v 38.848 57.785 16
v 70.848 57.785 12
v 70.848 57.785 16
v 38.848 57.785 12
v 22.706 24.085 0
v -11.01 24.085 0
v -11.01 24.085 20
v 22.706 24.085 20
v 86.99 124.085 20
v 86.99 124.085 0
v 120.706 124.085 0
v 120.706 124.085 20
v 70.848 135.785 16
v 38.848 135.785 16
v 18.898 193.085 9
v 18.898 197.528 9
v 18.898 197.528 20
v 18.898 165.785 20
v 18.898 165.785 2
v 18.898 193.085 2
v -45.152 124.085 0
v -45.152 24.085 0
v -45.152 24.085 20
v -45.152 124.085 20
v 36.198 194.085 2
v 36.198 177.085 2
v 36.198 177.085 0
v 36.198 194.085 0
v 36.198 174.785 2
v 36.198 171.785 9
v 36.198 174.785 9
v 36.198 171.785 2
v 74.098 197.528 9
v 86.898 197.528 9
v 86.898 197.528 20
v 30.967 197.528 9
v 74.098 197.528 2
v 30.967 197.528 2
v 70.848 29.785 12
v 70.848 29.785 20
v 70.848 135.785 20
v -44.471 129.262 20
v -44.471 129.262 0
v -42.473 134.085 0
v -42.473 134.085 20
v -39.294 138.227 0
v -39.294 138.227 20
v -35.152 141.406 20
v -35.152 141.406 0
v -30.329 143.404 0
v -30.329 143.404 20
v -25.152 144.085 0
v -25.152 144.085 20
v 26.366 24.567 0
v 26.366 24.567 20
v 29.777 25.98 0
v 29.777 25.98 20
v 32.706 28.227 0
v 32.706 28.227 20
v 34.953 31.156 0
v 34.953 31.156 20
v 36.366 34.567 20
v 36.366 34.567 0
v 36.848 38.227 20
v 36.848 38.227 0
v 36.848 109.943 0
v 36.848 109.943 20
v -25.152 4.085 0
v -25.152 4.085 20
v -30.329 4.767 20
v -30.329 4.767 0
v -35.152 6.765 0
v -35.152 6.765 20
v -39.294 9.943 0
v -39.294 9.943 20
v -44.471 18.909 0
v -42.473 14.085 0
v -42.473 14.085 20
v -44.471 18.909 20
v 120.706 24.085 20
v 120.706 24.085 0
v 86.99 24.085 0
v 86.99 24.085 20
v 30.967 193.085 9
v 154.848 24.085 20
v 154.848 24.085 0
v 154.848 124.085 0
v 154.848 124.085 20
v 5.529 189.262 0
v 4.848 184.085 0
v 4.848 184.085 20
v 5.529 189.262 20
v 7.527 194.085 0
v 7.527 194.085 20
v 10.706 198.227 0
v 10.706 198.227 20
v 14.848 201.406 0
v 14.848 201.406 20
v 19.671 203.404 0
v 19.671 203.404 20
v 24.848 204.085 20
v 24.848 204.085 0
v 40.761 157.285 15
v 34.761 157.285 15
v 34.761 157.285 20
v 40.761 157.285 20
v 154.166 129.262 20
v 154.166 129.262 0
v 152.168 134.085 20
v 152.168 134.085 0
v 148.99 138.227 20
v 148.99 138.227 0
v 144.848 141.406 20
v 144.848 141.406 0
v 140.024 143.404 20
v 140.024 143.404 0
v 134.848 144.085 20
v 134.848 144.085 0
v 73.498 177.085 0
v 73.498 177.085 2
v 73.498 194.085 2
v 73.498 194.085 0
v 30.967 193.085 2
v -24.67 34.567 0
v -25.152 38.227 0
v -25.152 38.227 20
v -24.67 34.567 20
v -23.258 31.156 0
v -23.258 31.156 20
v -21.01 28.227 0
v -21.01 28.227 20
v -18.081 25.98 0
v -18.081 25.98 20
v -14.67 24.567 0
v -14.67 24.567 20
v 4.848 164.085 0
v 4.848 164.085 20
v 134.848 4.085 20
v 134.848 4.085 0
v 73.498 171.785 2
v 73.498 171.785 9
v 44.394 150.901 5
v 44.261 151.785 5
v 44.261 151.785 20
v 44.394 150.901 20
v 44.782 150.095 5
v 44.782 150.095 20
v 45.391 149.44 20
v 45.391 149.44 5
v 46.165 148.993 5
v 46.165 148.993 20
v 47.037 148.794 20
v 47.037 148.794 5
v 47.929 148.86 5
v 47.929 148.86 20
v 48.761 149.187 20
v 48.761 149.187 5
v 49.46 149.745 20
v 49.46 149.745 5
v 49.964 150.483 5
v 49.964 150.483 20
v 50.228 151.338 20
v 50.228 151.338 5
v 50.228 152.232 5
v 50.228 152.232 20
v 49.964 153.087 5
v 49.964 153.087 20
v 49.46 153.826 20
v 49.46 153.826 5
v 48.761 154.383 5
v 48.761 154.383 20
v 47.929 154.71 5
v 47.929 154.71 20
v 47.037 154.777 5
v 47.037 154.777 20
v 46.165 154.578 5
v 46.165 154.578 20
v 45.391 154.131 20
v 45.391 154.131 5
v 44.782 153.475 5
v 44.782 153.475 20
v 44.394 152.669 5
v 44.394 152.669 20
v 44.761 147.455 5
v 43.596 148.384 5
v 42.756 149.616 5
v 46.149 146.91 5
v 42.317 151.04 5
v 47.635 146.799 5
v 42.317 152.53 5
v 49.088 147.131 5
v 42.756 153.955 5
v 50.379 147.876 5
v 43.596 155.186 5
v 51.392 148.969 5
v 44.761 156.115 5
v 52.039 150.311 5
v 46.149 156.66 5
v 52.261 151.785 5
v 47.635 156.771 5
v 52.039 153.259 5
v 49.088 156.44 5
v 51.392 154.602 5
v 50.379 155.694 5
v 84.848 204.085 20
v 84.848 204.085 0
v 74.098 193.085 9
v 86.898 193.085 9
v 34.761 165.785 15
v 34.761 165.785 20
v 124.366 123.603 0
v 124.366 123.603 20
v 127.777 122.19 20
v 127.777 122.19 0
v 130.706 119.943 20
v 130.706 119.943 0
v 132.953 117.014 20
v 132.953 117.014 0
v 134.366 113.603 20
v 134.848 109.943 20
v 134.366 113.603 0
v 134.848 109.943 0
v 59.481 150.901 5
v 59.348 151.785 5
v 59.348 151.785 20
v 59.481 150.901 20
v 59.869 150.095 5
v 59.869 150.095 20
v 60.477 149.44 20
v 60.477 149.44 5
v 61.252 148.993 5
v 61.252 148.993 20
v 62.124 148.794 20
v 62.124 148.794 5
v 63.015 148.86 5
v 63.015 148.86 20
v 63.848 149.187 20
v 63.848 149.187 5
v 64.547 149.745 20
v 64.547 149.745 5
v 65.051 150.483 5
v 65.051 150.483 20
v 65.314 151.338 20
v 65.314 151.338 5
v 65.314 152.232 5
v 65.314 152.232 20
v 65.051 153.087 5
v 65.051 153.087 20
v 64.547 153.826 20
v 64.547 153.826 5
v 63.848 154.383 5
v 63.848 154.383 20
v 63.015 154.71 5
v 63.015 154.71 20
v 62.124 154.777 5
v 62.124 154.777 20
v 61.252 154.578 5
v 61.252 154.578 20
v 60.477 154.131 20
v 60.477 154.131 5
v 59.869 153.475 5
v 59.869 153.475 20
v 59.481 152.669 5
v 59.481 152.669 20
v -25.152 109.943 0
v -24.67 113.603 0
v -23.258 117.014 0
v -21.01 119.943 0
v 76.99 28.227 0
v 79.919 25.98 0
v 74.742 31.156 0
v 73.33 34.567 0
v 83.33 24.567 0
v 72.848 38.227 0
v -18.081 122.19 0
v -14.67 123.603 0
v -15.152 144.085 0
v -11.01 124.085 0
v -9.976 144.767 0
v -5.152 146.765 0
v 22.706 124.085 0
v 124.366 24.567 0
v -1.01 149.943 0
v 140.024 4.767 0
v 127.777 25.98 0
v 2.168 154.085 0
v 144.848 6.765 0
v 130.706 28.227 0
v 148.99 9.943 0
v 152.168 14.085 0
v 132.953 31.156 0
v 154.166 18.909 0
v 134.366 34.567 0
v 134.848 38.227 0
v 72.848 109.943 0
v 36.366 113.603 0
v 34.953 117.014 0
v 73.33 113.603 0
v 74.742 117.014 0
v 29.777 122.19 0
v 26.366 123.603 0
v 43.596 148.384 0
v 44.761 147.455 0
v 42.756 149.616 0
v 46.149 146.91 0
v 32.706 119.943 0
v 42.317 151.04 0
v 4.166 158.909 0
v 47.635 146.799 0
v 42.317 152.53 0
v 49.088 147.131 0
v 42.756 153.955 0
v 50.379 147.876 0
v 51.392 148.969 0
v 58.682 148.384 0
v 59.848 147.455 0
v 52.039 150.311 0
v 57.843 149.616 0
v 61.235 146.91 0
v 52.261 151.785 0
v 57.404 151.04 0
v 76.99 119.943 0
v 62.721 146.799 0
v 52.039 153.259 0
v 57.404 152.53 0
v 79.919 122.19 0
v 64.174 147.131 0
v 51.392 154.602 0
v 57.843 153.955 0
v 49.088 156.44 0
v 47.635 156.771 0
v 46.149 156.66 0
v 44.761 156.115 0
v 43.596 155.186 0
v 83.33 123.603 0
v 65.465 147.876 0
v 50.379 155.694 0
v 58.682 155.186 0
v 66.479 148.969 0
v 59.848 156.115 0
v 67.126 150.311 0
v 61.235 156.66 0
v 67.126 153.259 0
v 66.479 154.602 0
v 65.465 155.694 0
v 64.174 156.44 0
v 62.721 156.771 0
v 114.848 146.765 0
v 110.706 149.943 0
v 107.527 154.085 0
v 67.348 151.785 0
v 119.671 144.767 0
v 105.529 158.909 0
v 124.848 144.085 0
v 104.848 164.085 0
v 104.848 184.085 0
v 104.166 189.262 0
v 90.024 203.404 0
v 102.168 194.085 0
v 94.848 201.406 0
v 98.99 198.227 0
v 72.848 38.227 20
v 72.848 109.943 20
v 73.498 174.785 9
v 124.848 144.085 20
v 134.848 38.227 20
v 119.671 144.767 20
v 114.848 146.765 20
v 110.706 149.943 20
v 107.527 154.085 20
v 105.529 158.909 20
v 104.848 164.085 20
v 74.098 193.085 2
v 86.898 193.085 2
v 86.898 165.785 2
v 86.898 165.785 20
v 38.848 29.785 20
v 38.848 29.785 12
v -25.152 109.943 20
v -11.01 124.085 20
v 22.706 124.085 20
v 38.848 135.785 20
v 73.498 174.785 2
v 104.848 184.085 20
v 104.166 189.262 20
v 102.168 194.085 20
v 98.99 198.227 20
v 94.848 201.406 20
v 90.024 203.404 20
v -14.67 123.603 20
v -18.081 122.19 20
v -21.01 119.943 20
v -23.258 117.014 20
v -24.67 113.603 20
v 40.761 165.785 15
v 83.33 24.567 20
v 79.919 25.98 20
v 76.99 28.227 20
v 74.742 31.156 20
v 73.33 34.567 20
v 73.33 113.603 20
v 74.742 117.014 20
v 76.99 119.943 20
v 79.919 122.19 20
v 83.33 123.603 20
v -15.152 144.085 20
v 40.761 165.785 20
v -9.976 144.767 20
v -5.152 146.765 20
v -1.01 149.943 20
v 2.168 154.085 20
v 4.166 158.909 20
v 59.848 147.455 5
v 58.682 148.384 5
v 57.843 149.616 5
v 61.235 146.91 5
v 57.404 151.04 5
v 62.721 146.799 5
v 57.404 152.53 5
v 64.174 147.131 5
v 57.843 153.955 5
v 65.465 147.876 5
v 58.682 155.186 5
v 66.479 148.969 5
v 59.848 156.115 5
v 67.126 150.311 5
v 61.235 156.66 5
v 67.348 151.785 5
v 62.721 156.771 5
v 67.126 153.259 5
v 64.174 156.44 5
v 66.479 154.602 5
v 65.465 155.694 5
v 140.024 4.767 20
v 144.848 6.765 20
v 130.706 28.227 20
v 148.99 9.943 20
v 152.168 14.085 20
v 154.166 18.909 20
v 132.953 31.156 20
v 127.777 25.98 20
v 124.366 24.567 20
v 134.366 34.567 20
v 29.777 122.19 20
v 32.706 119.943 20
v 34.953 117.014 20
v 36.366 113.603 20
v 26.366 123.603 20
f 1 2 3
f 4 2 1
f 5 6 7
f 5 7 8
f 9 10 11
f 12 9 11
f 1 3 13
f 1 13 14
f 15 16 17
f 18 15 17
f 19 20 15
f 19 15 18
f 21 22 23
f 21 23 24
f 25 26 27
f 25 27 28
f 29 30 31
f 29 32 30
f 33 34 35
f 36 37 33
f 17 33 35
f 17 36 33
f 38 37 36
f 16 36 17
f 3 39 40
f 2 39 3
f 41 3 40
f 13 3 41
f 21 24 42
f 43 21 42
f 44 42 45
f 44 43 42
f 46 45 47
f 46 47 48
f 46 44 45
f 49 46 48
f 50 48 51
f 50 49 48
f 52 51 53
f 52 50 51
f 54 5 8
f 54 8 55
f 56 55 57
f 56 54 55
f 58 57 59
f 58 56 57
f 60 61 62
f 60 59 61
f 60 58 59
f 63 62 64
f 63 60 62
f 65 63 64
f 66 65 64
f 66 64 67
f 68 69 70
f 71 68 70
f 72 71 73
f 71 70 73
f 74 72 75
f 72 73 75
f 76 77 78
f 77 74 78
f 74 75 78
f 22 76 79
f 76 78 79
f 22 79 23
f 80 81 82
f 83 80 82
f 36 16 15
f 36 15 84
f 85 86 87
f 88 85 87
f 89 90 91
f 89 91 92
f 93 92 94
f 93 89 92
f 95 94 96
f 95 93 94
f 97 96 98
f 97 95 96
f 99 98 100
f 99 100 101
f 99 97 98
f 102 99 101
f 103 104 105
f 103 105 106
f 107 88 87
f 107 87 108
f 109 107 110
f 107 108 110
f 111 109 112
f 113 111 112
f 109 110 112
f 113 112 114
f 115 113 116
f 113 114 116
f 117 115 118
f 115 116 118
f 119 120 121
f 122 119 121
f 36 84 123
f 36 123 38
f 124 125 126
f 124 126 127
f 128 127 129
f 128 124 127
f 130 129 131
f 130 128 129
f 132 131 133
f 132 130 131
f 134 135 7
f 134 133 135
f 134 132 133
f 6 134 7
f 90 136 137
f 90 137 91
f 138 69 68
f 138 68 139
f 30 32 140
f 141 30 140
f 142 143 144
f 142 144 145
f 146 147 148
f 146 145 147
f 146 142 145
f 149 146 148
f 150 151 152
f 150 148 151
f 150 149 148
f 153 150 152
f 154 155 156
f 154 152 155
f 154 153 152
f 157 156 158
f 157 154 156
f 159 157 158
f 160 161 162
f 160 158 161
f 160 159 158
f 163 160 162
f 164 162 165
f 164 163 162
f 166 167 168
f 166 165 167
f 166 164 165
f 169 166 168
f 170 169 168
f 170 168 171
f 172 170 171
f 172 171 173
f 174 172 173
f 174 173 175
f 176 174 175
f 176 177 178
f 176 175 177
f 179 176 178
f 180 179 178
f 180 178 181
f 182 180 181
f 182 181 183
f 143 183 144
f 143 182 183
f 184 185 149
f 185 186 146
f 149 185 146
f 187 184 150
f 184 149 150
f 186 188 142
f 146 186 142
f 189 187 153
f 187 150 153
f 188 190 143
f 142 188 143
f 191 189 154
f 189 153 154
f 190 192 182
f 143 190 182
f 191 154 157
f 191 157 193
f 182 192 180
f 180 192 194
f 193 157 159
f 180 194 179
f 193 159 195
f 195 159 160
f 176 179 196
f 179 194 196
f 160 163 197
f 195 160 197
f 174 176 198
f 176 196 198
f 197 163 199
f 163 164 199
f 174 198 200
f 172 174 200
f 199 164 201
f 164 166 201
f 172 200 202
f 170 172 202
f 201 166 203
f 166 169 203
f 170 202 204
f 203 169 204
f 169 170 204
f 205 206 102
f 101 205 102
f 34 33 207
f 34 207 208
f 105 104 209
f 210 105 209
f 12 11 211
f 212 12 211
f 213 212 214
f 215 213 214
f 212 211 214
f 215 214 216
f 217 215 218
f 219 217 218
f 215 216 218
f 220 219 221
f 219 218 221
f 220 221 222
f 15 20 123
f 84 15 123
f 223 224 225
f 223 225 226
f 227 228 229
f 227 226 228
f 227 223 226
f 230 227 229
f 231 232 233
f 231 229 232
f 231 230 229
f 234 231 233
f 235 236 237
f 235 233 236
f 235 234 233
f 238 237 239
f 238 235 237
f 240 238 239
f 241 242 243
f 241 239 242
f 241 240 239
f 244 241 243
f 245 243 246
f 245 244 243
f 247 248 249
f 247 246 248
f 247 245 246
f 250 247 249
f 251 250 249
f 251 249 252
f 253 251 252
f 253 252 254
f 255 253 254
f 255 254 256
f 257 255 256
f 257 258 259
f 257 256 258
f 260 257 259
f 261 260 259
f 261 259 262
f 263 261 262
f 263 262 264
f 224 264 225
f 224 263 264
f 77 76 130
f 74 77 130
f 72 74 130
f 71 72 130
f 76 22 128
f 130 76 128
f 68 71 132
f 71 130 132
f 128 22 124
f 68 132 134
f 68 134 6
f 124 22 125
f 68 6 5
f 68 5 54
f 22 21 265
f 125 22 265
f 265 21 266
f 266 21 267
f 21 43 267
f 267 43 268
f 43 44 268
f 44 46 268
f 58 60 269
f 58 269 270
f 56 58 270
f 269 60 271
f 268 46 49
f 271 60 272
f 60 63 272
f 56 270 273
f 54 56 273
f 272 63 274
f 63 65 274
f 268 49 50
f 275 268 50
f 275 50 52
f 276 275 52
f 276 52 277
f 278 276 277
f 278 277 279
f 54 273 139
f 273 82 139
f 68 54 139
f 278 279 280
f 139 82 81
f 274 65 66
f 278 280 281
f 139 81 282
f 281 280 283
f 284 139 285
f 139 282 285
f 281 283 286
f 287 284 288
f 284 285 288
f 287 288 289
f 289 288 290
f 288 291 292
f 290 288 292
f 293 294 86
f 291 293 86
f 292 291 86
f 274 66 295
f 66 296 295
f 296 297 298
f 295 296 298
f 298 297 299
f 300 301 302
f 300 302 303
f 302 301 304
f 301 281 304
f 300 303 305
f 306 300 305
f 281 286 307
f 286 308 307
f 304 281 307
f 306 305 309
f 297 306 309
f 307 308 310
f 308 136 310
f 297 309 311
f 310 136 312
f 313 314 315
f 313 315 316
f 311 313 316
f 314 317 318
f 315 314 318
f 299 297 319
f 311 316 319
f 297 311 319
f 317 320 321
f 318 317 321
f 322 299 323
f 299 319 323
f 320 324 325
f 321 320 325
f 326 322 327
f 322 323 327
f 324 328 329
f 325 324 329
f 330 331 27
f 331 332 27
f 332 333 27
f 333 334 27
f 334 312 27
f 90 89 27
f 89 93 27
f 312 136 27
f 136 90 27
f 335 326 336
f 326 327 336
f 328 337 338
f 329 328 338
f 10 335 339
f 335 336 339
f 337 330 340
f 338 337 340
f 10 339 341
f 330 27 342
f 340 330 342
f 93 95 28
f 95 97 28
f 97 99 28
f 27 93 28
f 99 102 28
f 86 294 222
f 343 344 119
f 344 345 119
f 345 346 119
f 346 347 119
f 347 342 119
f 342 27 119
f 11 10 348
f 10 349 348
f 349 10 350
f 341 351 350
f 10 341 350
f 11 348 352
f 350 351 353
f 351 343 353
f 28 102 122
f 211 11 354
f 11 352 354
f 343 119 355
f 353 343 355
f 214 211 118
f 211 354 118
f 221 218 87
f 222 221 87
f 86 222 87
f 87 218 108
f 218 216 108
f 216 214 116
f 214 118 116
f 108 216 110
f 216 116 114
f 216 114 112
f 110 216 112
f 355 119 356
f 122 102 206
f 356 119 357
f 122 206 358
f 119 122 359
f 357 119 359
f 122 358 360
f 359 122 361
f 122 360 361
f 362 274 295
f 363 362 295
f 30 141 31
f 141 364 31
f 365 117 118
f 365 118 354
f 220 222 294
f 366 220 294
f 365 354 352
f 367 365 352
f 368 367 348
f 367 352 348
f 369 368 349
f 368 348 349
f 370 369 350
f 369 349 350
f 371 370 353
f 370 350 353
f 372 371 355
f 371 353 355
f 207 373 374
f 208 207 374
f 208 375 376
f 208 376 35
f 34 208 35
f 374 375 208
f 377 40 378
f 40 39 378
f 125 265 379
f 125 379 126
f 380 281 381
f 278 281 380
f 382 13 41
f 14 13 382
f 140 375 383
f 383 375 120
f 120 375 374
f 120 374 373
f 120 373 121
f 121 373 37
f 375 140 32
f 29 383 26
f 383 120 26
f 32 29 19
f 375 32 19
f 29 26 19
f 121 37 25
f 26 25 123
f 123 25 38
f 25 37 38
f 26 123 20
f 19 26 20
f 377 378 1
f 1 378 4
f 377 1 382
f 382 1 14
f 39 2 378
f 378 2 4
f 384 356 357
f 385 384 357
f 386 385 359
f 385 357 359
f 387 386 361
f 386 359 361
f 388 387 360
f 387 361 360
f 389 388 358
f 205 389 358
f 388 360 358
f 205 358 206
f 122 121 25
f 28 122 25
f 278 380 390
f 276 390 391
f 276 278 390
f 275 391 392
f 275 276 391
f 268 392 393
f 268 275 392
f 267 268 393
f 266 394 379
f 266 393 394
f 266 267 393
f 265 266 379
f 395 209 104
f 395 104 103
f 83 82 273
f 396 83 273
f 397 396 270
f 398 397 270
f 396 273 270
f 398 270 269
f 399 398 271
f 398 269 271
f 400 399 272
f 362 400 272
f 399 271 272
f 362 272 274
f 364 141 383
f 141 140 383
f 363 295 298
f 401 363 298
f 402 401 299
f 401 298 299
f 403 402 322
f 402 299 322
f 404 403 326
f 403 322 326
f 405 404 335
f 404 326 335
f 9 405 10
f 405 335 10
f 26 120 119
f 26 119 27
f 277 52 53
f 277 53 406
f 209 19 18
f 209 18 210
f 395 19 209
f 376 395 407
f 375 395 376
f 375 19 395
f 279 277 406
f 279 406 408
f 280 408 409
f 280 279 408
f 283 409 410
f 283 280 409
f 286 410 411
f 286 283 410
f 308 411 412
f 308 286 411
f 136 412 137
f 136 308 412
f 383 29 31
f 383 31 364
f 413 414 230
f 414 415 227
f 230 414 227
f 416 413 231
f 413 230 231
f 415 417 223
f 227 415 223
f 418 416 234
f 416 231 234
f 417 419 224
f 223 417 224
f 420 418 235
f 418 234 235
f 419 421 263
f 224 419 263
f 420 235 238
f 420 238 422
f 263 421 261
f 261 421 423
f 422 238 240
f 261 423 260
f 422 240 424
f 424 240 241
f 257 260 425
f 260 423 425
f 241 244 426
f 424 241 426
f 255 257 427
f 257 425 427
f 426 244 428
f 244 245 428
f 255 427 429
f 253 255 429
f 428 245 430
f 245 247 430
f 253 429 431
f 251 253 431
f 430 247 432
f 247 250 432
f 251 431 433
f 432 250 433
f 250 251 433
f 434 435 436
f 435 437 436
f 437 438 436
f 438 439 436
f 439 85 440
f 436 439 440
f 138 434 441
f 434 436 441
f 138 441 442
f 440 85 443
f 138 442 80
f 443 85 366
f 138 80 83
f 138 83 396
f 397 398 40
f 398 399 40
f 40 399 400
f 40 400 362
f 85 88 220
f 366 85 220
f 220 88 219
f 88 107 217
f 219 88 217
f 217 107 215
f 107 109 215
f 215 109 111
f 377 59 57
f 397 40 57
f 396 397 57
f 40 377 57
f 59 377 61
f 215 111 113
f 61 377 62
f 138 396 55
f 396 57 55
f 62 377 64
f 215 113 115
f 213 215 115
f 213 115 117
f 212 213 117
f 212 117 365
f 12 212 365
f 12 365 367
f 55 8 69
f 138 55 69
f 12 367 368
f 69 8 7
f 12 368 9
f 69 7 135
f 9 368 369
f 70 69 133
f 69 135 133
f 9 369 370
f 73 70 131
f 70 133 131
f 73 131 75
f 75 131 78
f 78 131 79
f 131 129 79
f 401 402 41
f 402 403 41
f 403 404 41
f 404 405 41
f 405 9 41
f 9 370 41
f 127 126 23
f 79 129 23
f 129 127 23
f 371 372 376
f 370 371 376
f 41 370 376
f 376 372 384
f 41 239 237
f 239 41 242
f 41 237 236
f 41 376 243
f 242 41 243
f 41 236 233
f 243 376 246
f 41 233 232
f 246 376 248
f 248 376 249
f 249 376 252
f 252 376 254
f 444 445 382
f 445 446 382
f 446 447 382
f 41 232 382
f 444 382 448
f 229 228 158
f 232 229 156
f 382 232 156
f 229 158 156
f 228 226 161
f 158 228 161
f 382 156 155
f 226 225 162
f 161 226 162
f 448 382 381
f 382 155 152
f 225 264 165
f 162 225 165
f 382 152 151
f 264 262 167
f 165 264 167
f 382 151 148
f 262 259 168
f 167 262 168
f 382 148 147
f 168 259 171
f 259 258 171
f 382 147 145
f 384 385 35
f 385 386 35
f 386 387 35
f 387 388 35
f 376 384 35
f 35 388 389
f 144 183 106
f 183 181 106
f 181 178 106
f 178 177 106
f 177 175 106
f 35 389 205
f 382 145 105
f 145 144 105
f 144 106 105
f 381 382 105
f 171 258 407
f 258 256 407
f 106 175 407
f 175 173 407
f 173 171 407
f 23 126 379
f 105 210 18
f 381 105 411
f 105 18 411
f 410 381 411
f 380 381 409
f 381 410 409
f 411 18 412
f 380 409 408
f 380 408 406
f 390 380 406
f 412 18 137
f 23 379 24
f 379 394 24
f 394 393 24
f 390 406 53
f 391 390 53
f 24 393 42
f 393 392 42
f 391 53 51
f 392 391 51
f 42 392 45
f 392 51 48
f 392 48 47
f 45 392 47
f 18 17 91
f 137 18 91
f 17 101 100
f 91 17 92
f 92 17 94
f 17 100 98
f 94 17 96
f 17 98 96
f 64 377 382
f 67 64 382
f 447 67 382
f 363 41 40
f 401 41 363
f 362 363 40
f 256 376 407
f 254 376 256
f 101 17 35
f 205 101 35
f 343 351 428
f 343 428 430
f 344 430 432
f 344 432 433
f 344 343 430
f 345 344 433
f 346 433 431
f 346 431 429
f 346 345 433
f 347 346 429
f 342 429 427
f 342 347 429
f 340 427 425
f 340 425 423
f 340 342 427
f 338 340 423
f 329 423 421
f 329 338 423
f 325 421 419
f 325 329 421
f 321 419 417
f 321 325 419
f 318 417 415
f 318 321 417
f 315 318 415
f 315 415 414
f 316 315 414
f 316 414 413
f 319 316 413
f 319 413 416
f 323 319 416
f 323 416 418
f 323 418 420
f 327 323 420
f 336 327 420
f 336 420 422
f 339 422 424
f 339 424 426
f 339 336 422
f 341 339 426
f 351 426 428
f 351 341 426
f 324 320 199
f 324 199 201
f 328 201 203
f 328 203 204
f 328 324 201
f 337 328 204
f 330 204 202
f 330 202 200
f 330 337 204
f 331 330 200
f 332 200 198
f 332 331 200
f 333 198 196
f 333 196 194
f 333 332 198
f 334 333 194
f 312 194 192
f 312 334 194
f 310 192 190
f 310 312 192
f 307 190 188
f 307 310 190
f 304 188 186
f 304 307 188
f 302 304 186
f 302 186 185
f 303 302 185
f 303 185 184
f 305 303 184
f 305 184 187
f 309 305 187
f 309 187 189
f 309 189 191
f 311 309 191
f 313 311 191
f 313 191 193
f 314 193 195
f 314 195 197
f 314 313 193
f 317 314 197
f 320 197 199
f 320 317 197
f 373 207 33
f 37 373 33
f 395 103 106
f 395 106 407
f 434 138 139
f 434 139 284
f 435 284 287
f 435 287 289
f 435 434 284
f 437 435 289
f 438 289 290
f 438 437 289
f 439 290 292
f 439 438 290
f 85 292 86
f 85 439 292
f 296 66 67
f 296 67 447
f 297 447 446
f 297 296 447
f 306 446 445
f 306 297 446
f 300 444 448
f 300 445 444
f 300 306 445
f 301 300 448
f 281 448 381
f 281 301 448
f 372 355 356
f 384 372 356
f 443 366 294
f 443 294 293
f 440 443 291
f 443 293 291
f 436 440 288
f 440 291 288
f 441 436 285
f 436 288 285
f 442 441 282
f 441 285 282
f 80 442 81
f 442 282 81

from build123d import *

# Parameters (mm, degrees)
IZIM1_W                      = 200
IZIM1_H                      = 230
Y_KSEKLIK_EKSTR_ZYON1_DEPTH  = 20
KES_EKSTR_ZYON11_DEPTH       = 75
IZIM4_W                      = 100
IZIM4_H                      = 230
KES_EKSTR_ZYON12_DEPTH       = 90
IZIM10_W                     = 32
IZIM10_H                     = 136
Y_KSEKLIK_EKSTR_ZYON6_DEPTH  = 20
KES_EKSTR_ZYON15_DEPTH       = 222
KES_EKSTR_ZYON15_DEPTH_BACK  = 26
Y_KSEKLIK_EKSTR_ZYON7_DEPTH  = 20
IZIM16_W                     = 37.3
IZIM16_H                     = 17
KES_EKSTR_ZYON16_DEPTH       = 20
KES_EKSTR_ZYON20_DEPTH       = 42
KES_EKSTR_ZYON21_DEPTH       = 42
IZIM20_W                     = 71.9
IZIM20_H                     = 2
KES_EKSTR_ZYON22_DEPTH       = 42
IZIM21_R                     = 1.5
Y_KSEKLIK_EKSTR_ZYON8_DEPTH  = 15
IZIM22_W                     = 3
IZIM22_H                     = 3
Y_KSEKLIK_EKSTR_ZYON9_DEPTH  = 8
IZIM23_W                     = 71.9
IZIM23_H                     = 36
Y_KSEKLIK_EKSTR_ZYON10_DEPTH = 1
KES_EKSTR_ZYON23_DEPTH       = 56
KES_EKSTR_ZYON23_DEPTH_BACK  = 86
IZIM24_W                     = 37.3
IZIM24_H                     = 17
IZIM26_W                     = 3
IZIM26_H                     = 3
Y_KSEKLIK_EKSTR_ZYON11_DEPTH = 8
IZIM27_W                     = 71.9
IZIM27_H                     = 2.056938391
Y_KSEKLIK_EKSTR_ZYON13_DEPTH = 19
Y_KSEKLIK_EKSTR_ZYON16_DEPTH = 19
IZIM31_W                     = 3
IZIM31_H                     = 3
Y_KSEKLIK_EKSTR_ZYON18_DEPTH = 8
IZIM32_R                     = 1.5
KES_EKSTR_ZYON24_DEPTH       = 32
IZIM33_R                     = 1.5
Y_KSEKLIK_EKSTR_ZYON19_DEPTH = 12
KES_EKSTR_ZYON27_DEPTH       = 1
KES_EKSTR_ZYON27_DEPTH_BACK  = 3
IZIM37_R                     = 2.5
KES_EKSTR_ZYON28_DEPTH       = 33
IZIM38_W                     = 34
IZIM38_H                     = 110
KES_EKSTR_ZYON33_DEPTH       = 42
IZIM40_W                     = 34
IZIM40_H                     = 110
Y_KSEKLIK_EKSTR_ZYON21_DEPTH = 15
IZIM41_W                     = 4
IZIM41_H                     = 8.5
KES_EKSTR_ZYON35_DEPTH       = 21
IZIM44_W                     = 4
IZIM44_H                     = 8.5
Y_KSEKLIK_EKSTR_ZYON23_DEPTH = 14
IZIM45_W                     = 1
IZIM45_H                     = 110
Y_KSEKLIK_EKSTR_ZYON25_DEPTH = 19
IZIM46_W                     = 12.0691428
IZIM46_H                     = 4.443061609
IZIM46_W_2                   = 12.8
Y_KSEKLIK_EKSTR_ZYON27_DEPTH = 8
IZIM47_W                     = 37.3
IZIM47_H                     = 3
Y_KSEKLIK_EKSTR_ZYON28_DEPTH = 8
KES_EKSTR_ZYON36_DEPTH       = 10
KES_EKSTR_ZYON36_DEPTH_BACK  = 38
IZIM48_W                     = 201.789222688
IZIM48_H                     = 30
KES_EKSTR_ZYON37_DEPTH       = 38
KES_EKSTR_ZYON37_DEPTH_BACK  = 38
KES_EKSTR_ZYON38_DEPTH       = 38
KES_EKSTR_ZYON38_DEPTH_BACK  = 38
SKETCH1_W                    = 32
SKETCH1_H                    = 28
CUT_EXTRUDE1_DEPTH           = 55
SKETCH2_W                    = 32
SKETCH2_H                    = 28
BOSS_EXTRUDE1_DEPTH          = 11
SKETCH3_W                    = 32
SKETCH3_H                    = 4
BOSS_EXTRUDE2_DEPTH          = 19
SKETCH4_W                    = 37.3
SKETCH4_H                    = 0.358806935
CUT_EXTRUDE3_DEPTH           = 11
SKETCH5_W                    = 37.3
SKETCH5_H                    = 0.35880693
BOSS_EXTRUDE3_DEPTH          = 9
SKETCH6_W                    = 37.3
SKETCH6_H                    = 0.358806935
BOSS_EXTRUDE4_DEPTH          = 2
SKETCH7_W                    = 6
SKETCH7_H                    = 8.5
CUT_EXTRUDE4_DEPTH           = 20
SKETCH8_W                    = 6
SKETCH8_H                    = 8.5
BOSS_EXTRUDE5_DEPTH          = 15
SKETCH9_R                    = 3
CUT_EXTRUDE5_DEPTH           = 27
SKETCH10_W                   = 12.0691428
SKETCH10_H                   = 4.443061609
CUT_EXTRUDE8_DEPTH           = 20
SKETCH11_W                   = 12.8
SKETCH11_H                   = 4.443061609
CUT_EXTRUDE9_DEPTH           = 22
SKETCH12_W                   = 12.0691428
SKETCH12_H                   = 4.443061609
SKETCH12_W_2                 = 12.8
BOSS_EXTRUDE6_DEPTH          = 9
CUT_EXTRUDE10_DEPTH          = 37
SKETCH14_R                   = 5
CUT_EXTRUDE11_DEPTH          = 5


with BuildPart() as part:
    # Çizim1 → Yükseklik-Ekstrüzyon1 (new body)
    with BuildSketch(Plane.XY):
        with Locations((54.847725907, 89.085138461)):
            Rectangle(IZIM1_W, IZIM1_H)
    extrude(amount=Y_KSEKLIK_EKSTR_ZYON1_DEPTH)

    # Çizim2 → Kes-Ekstrüzyon11 (cut)
    with BuildSketch(Plane.XY):
        with BuildLine():
            Line((4.847725907, 164.085138461), (4.847725907, 184.085138461))
            ThreePointArc((4.847725907, 184.085138461), (10.705590284, 198.227274085), (24.847725907, 204.085138461))
            Line((24.847725907, 204.085138461), (-45.152274093, 204.085138461))
            Line((-45.152274093, 204.085138461), (-45.152274093, 124.085138461))
            ThreePointArc((-45.152274093, 124.085138461), (-39.294409716, 138.227274085), (-25.152274093, 144.085138461))
            Line((-25.152274093, 144.085138461), (-15.152274093, 144.085138461))
            ThreePointArc((-15.152274093, 144.085138461), (-1.010138469, 149.943002837), (4.847725907, 164.085138461))
        make_face()
        with BuildLine():
            Line((-45.152274093, -25.914861539), (-25.152274093, -25.914861539))
            ThreePointArc((-25.152274093, -25.914861539), (-39.294409716, -20.056997163), (-45.152274093, -5.914861539))
            Line((-45.152274093, -5.914861539), (-45.152274093, -25.914861539))
        make_face()
    extrude(amount=KES_EKSTR_ZYON11_DEPTH, mode=Mode.SUBTRACT)

    # Çizim4 → Kes-Ekstrüzyon12 (cut)
    with BuildSketch(Plane.XY):
        with Locations((104.847725907, 89.085138461)):
            Rectangle(IZIM4_W, IZIM4_H)
    extrude(amount=KES_EKSTR_ZYON12_DEPTH, mode=Mode.SUBTRACT)

    # Aynalama35: part across plane


with BuildPart() as part_1:
    add(part.part)
    add(part.part.mirror(Plane(origin=(54.847725907, 0, 90), x_dir=(0, 0, 1), z_dir=(-1, 0, 0))))

    # Çizim10 → Yükseklik-Ekstrüzyon6 (add)
    with BuildSketch(Plane.XY):
        Polygon((38.847725907, 129.085138461), (72.847725907, 129.085138461), (72.847725907, -10.914861539), (36.847725907, -10.914861539), (36.847725907, 129.085138461), align=None)
        with Locations((54.847725907, 59.085138461)):
            Rectangle(IZIM10_W, IZIM10_H, mode=Mode.SUBTRACT)
    extrude(amount=-Y_KSEKLIK_EKSTR_ZYON6_DEPTH)

    # Çizim11 → Kes-Ekstrüzyon15 (cut, two sides: drawn at the far end of the back side and taken through both)
    with BuildSketch(Plane(origin=(0, 0, 0), x_dir=(0, 0, -1), z_dir=(1, 0, 0)).offset(-KES_EKSTR_ZYON15_DEPTH_BACK)):
        Polygon((20, -10.914861539), (14, -10.914861539), (20, 129.085138461), align=None)
    extrude(amount=KES_EKSTR_ZYON15_DEPTH + KES_EKSTR_ZYON15_DEPTH_BACK, mode=Mode.SUBTRACT)

    # Çizim15 → Yükseklik-Ekstrüzyon7 (add)
    with BuildSketch(Plane.XY):
        with BuildLine():
            Line((-45.152274093, 124.085138461), (-45.152274093, -5.914861539))
            ThreePointArc((-45.152274093, -5.914861539), (-39.294409716, -20.056997163), (-25.152274093, -25.914861539))
            Line((-25.152274093, -25.914861539), (134.847725907, -25.914861539))
            ThreePointArc((134.847725907, -25.914861539), (148.989861531, -20.056997163), (154.847725907, -5.914861539))
            Line((154.847725907, -5.914861539), (154.847725907, 124.085138461))
            ThreePointArc((154.847725907, 124.085138461), (148.989861531, 138.227274085), (134.847725907, 144.085138461))
            Line((134.847725907, 144.085138461), (124.847725907, 144.085138461))
            ThreePointArc((124.847725907, 144.085138461), (110.705590284, 149.943002837), (104.847725907, 164.085138461))
            Line((104.847725907, 164.085138461), (104.847725907, 184.085138461))
            ThreePointArc((104.847725907, 184.085138461), (98.989861531, 198.227274085), (84.847725907, 204.085138461))
            Line((84.847725907, 204.085138461), (24.847725907, 204.085138461))
            ThreePointArc((24.847725907, 204.085138461), (10.705590284, 198.227274085), (4.847725907, 184.085138461))
            Line((4.847725907, 184.085138461), (4.847725907, 164.085138461))
            ThreePointArc((4.847725907, 164.085138461), (-1.010138469, 149.943002837), (-15.152274093, 144.085138461))
            Line((-15.152274093, 144.085138461), (-25.152274093, 144.085138461))
            ThreePointArc((-25.152274093, 144.085138461), (-39.294409716, 138.227274085), (-45.152274093, 124.085138461))
        make_face()
    extrude(amount=Y_KSEKLIK_EKSTR_ZYON7_DEPTH)

    # Çizim16 → Kes-Ekstrüzyon16 (cut)
    with BuildSketch(Plane.XY):
        with Locations((54.847725907, 185.585138461)):
            Rectangle(IZIM16_W, IZIM16_H)
    extrude(amount=KES_EKSTR_ZYON16_DEPTH, mode=Mode.SUBTRACT)

    # Çizim18 → Kes-Ekstrüzyon20 (cut)
    with BuildSketch(Plane(origin=(0, 0, 1), x_dir=(-1, 0, 0), z_dir=(0, 0, -1))):
        Polygon((-90.797725907, 197.585138461), (-90.797725907, 185.585138461), (-90.797725907, 163.585138461), (-18.897725907, 163.585138461), (-18.897725907, 197.585138461), align=None)
    extrude(amount=-KES_EKSTR_ZYON20_DEPTH, mode=Mode.SUBTRACT)

    # Çizim19 → Kes-Ekstrüzyon21 (cut)
    with BuildSketch(Plane(origin=(72.847725907, 0, 0), x_dir=(0, 0, -1), z_dir=(1, 0, 0))):
        Polygon((0, 129.085138461), (20, 129.085138461), (14, -10.914861539), (0, -10.914861539), align=None)
    extrude(amount=-KES_EKSTR_ZYON21_DEPTH, mode=Mode.SUBTRACT)

    # Çizim20 → Kes-Ekstrüzyon22 (cut)
    with BuildSketch(Plane(origin=(0, 0, 1), x_dir=(-1, 0, 0), z_dir=(0, 0, -1))):
        with Locations((-54.847725907, 198.585138461)):
            Rectangle(IZIM20_W, IZIM20_H)
    extrude(amount=-KES_EKSTR_ZYON22_DEPTH, mode=Mode.SUBTRACT)

    # Çizim21 → Yükseklik-Ekstrüzyon8 (add)
    with BuildSketch(Plane.XY.offset(1)):
        with Locations((27.697725907, 194.585138461)):
            Circle(IZIM21_R)
        with Locations((75.597725907, 194.585138461)):
            Circle(IZIM21_R)
    extrude(amount=Y_KSEKLIK_EKSTR_ZYON8_DEPTH)

    # Çizim22 → Yükseklik-Ekstrüzyon9 (add)
    with BuildSketch(Plane(origin=(0, 0, 1), x_dir=(-1, 0, 0), z_dir=(0, 0, -1))):
        with Locations((-71.997725907, 172.926331526)):
            Rectangle(IZIM22_W, IZIM22_H)
        with Locations((-37.697725907, 172.926331526)):
            Rectangle(IZIM22_W, IZIM22_H)
    extrude(amount=-Y_KSEKLIK_EKSTR_ZYON9_DEPTH)

    # Çizim23 → Yükseklik-Ekstrüzyon10 (add)
    with BuildSketch(Plane(origin=(0, 0, 1), x_dir=(-1, 0, 0), z_dir=(0, 0, -1))):
        with Locations((-54.847725907, 181.585138461)):
            Rectangle(IZIM23_W, IZIM23_H)
    extrude(amount=-Y_KSEKLIK_EKSTR_ZYON10_DEPTH)

    # Çizim24 → Kes-Ekstrüzyon23 (cut, two sides: drawn at the far end of the back side and taken through both)
    with BuildSketch(Plane(origin=(0, 0, 1), x_dir=(-1, 0, 0), z_dir=(0, 0, -1)).offset(-KES_EKSTR_ZYON23_DEPTH_BACK)):
        with Locations((-54.847725907, 185.585138461)):
            Rectangle(IZIM24_W, IZIM24_H)
    extrude(amount=KES_EKSTR_ZYON23_DEPTH + KES_EKSTR_ZYON23_DEPTH_BACK, mode=Mode.SUBTRACT)

    # Çizim26 → Yükseklik-Ekstrüzyon11 (add)
    with BuildSketch(Plane(origin=(0, 0, 1), x_dir=(-1, 0, 0), z_dir=(0, 0, -1))):
        with Locations((-37.697725907, 172.926331526)):
            Rectangle(IZIM26_W, IZIM26_H)
    extrude(amount=-Y_KSEKLIK_EKSTR_ZYON11_DEPTH)

    # Çizim27 → Yükseklik-Ekstrüzyon13 (add)
    with BuildSketch(Plane(origin=(0, 0, 1), x_dir=(-1, 0, 0), z_dir=(0, 0, -1))):
        with Locations((-54.847725907, 198.556669266)):
            Rectangle(IZIM27_W, IZIM27_H)
    extrude(amount=-Y_KSEKLIK_EKSTR_ZYON13_DEPTH)

    # Çizim29 → Yükseklik-Ekstrüzyon16 (add)
    with BuildSketch(Plane(origin=(0, 0, 1), x_dir=(-1, 0, 0), z_dir=(0, 0, -1))):
        Polygon((-18.897725907, 163.585138461), (-18.897725907, 165.785138461), (-86.897725907, 165.785138461), (-86.897725907, 197.52820007), (-90.797725907, 197.52820007), (-90.797725907, 163.585138461), align=None)
    extrude(amount=-Y_KSEKLIK_EKSTR_ZYON16_DEPTH)

    # Çizim31 → Yükseklik-Ekstrüzyon18 (add)
    with BuildSketch(Plane(origin=(0, 0, 1), x_dir=(-1, 0, 0), z_dir=(0, 0, -1))):
        with Locations((-37.697725907, 172.926331526)):
            Rectangle(IZIM31_W, IZIM31_H)
        with Locations((-71.997725907, 172.926331526)):
            Rectangle(IZIM31_W, IZIM31_H)
    extrude(amount=-Y_KSEKLIK_EKSTR_ZYON18_DEPTH)

    # Çizim32 → Kes-Ekstrüzyon24 (cut)
    with BuildSketch(Plane(origin=(0, 0, 1), x_dir=(-1, 0, 0), z_dir=(0, 0, -1))):
        with Locations((-27.697725907, 194.585138461)):
            Circle(IZIM32_R)
        with Locations((-75.597725907, 194.585138461)):
            Circle(IZIM32_R)
    extrude(amount=-KES_EKSTR_ZYON24_DEPTH, mode=Mode.SUBTRACT)

    # Çizim33 → Yükseklik-Ekstrüzyon19 (add)
    with BuildSketch(Plane(origin=(0, 0, 1), x_dir=(-1, 0, 0), z_dir=(0, 0, -1))):
        with Locations((-27.697725907, 194.585138461)):
            Circle(IZIM33_R)
        with Locations((-75.597725907, 194.585138461)):
            Circle(IZIM33_R)
    extrude(amount=-Y_KSEKLIK_EKSTR_ZYON19_DEPTH)

    # Çizim34 → Kes-Ekstrüzyon27 (cut, two sides: drawn at the far end of the back side and taken through both)
    with BuildSketch(Plane(origin=(0, 0, 1), x_dir=(-1, 0, 0), z_dir=(0, 0, -1)).offset(-KES_EKSTR_ZYON27_DEPTH_BACK)):
        Polygon((-50.869562549, 153.785138461), (-51.995395574, 151.835138461), (-49.628259471, 147.735138461), (-44.893987263, 147.735138461), (-42.52685116, 151.835138461), (-44.893987263, 155.935138461), (-49.628259471, 155.935138461), align=None)
        Polygon((-64.714862011, 155.885138461), (-67.081998115, 151.785138461), (-64.714862011, 147.685138461), (-59.980589804, 147.685138461), (-57.6134537, 151.785138461), (-58.768154238, 153.785138461), (-59.980589804, 155.885138461), align=None)
    extrude(amount=KES_EKSTR_ZYON27_DEPTH + KES_EKSTR_ZYON27_DEPTH_BACK, mode=Mode.SUBTRACT)

    # Çizim37 → Kes-Ekstrüzyon28 (cut)
    with BuildSketch(Plane(origin=(0, 0, 1), x_dir=(-1, 0, 0), z_dir=(0, 0, -1))):
        with Locations((-62.347725907, 151.785138461)):
            Circle(IZIM37_R)
        with Locations((-47.261123367, 151.785138461)):
            Circle(IZIM37_R)
    extrude(amount=-KES_EKSTR_ZYON28_DEPTH, mode=Mode.SUBTRACT)

    # Çizim38 → Kes-Ekstrüzyon33 (cut)
    with BuildSketch(Plane(origin=(0, 0, 1), x_dir=(-1, 0, 0), z_dir=(0, 0, -1))):
        with Locations((-54.847725907, 84.785138461)):
            Rectangle(IZIM38_W, IZIM38_H)
    extrude(amount=-KES_EKSTR_ZYON33_DEPTH, mode=Mode.SUBTRACT)

    # Çizim40 → Yükseklik-Ekstrüzyon21 (add)
    with BuildSketch(Plane(origin=(0, 0, 1), x_dir=(-1, 0, 0), z_dir=(0, 0, -1))):
        with Locations((-54.847725907, 84.785138461)):
            Rectangle(IZIM40_W, IZIM40_H)
    extrude(amount=-Y_KSEKLIK_EKSTR_ZYON21_DEPTH)

    # Çizim41 → Kes-Ekstrüzyon35 (cut)
    with BuildSketch(Plane(origin=(0, 0, 1), x_dir=(-1, 0, 0), z_dir=(0, 0, -1))):
        with Locations((-37.761123367, 161.535138461)):
            Rectangle(IZIM41_W, IZIM41_H)
    extrude(amount=-KES_EKSTR_ZYON35_DEPTH, mode=Mode.SUBTRACT)

    # Çizim44 → Yükseklik-Ekstrüzyon23 (add)
    with BuildSketch(Plane(origin=(0, 0, 1), x_dir=(-1, 0, 0), z_dir=(0, 0, -1))):
        with Locations((-37.761123367, 161.535138461)):
            Rectangle(IZIM44_W, IZIM44_H)
    extrude(amount=-Y_KSEKLIK_EKSTR_ZYON23_DEPTH)

    # Çizim45 → Yükseklik-Ekstrüzyon25 (add)
    with BuildSketch(Plane(origin=(0, 0, 1), x_dir=(-1, 0, 0), z_dir=(0, 0, -1))):
        with Locations((-38.347725907, 84.785138461)):
            Rectangle(IZIM45_W, IZIM45_H)
        with Locations((-71.347725907, 84.785138461)):
            Rectangle(IZIM45_W, IZIM45_H)
    extrude(amount=-Y_KSEKLIK_EKSTR_ZYON25_DEPTH)

    # Çizim46 → Yükseklik-Ekstrüzyon27 (add)
    with BuildSketch(Plane(origin=(0, 0, 1), x_dir=(-1, 0, 0), z_dir=(0, 0, -1))):
        with Locations((-24.932297307, 195.306669266)):
            Rectangle(IZIM46_W, IZIM46_H)
        with Locations((-80.497725907, 195.306669266)):
            Rectangle(IZIM46_W_2, IZIM46_H)
    extrude(amount=-Y_KSEKLIK_EKSTR_ZYON27_DEPTH)

    # Çizim47 → Yükseklik-Ekstrüzyon28 (add)
    with BuildSketch(Plane(origin=(0, 0, 1), x_dir=(-1, 0, 0), z_dir=(0, 0, -1))):
        with Locations((-54.847725907, 172.926331526)):
            Rectangle(IZIM47_W, IZIM47_H)
    extrude(amount=-Y_KSEKLIK_EKSTR_ZYON28_DEPTH)

    # Çizim48 → Kes-Ekstrüzyon36 (cut, two sides: drawn at the far end of the back side and taken through both)
    with BuildSketch(Plane(origin=(0, 0, 1), x_dir=(-1, 0, 0), z_dir=(0, 0, -1)).offset(-KES_EKSTR_ZYON36_DEPTH_BACK)):
        with Locations((-53.953114563, -10.914861539)):
            Rectangle(IZIM48_W, IZIM48_H)
    extrude(amount=KES_EKSTR_ZYON36_DEPTH + KES_EKSTR_ZYON36_DEPTH_BACK, mode=Mode.SUBTRACT)

    # Çizim49 → Kes-Ekstrüzyon37 (cut, two sides: drawn at the far end of the back side and taken through both)
    with BuildSketch(Plane(origin=(0, 0, 1), x_dir=(-1, 0, 0), z_dir=(0, 0, -1)).offset(-KES_EKSTR_ZYON37_DEPTH_BACK)):
        with BuildLine():
            Line((-154.847725907, 4.085138461), (-134.847725907, 4.085138461))
            ThreePointArc((-134.847725907, 4.085138461), (-148.989861531, 9.943002837), (-154.847725907, 24.085138461))
            Line((-154.847725907, 24.085138461), (-154.847725907, 4.085138461))
        make_face()
    extrude(amount=KES_EKSTR_ZYON37_DEPTH + KES_EKSTR_ZYON37_DEPTH_BACK, mode=Mode.SUBTRACT)

    # Çizim50 → Kes-Ekstrüzyon38 (cut, two sides: drawn at the far end of the back side and taken through both)
    with BuildSketch(Plane(origin=(0, 0, 1), x_dir=(-1, 0, 0), z_dir=(0, 0, -1)).offset(-KES_EKSTR_ZYON38_DEPTH_BACK)):
        with BuildLine():
            Line((45.152274093, 4.085138461), (25.152274093, 4.085138461))
            ThreePointArc((25.152274093, 4.085138461), (39.294409716, 9.943002837), (45.152274093, 24.085138461))
            Line((45.152274093, 24.085138461), (45.152274093, 4.085138461))
        make_face()
    extrude(amount=KES_EKSTR_ZYON38_DEPTH + KES_EKSTR_ZYON38_DEPTH_BACK, mode=Mode.SUBTRACT)

    # Sketch1 → Cut-Extrude1 (cut)
    with BuildSketch(Plane(origin=(0, 0, 1), x_dir=(-1, 0, 0), z_dir=(0, 0, -1))):
        with Locations((-54.847725907, 43.785138461)):
            Rectangle(SKETCH1_W, SKETCH1_H)
    extrude(amount=-CUT_EXTRUDE1_DEPTH, mode=Mode.SUBTRACT)

    # Sketch2 → Boss-Extrude1 (add)
    with BuildSketch(Plane(origin=(0, 0, 1), x_dir=(-1, 0, 0), z_dir=(0, 0, -1))):
        with Locations((-54.847725907, 43.785138461)):
            Rectangle(SKETCH2_W, SKETCH2_H)
    extrude(amount=-BOSS_EXTRUDE1_DEPTH)

    # Sketch3 → Boss-Extrude2 (add)
    with BuildSketch(Plane(origin=(0, 0, 1), x_dir=(-1, 0, 0), z_dir=(0, 0, -1))):
        with Locations((-54.847725907, 137.785138461)):
            Rectangle(SKETCH3_W, SKETCH3_H)
    extrude(amount=-BOSS_EXTRUDE2_DEPTH)

    # Sketch4 → Cut-Extrude3 (cut)
    with BuildSketch(Plane.XY):
        with Locations((54.847725907, 171.605734993)):
            Rectangle(SKETCH4_W, SKETCH4_H)
    extrude(amount=CUT_EXTRUDE3_DEPTH, mode=Mode.SUBTRACT)

    # Sketch5 → Boss-Extrude3 (add)
    with BuildSketch(Plane.XY):
        with Locations((54.847725907, 174.605734991)):
            Rectangle(SKETCH5_W, SKETCH5_H)
    extrude(amount=BOSS_EXTRUDE3_DEPTH)

    # Sketch6 → Boss-Extrude4 (add)
    with BuildSketch(Plane.XY):
        with Locations((54.847725907, 171.605734993)):
            Rectangle(SKETCH6_W, SKETCH6_H)
    extrude(amount=BOSS_EXTRUDE4_DEPTH)

    # Sketch7 → Cut-Extrude4 (cut)
    with BuildSketch(Plane.XY):
        with Locations((37.761123367, 161.535138461)):
            Rectangle(SKETCH7_W, SKETCH7_H)
    extrude(amount=CUT_EXTRUDE4_DEPTH, mode=Mode.SUBTRACT)

    # Sketch8 → Boss-Extrude5 (add)
    with BuildSketch(Plane.XY):
        with Locations((37.761123367, 161.535138461)):
            Rectangle(SKETCH8_W, SKETCH8_H)
    extrude(amount=BOSS_EXTRUDE5_DEPTH)

    # Sketch9 → Cut-Extrude5 (cut)
    with BuildSketch(Plane.XY):
        with Locations((62.347725907, 151.785138461)):
            Circle(SKETCH9_R)
        with Locations((47.261123367, 151.785138461)):
            Circle(SKETCH9_R)
    extrude(amount=CUT_EXTRUDE5_DEPTH, mode=Mode.SUBTRACT)

    # Sketch10 → Cut-Extrude8 (cut)
    with BuildSketch(Plane.XY):
        with Locations((24.932297307, 195.306669266)):
            Rectangle(SKETCH10_W, SKETCH10_H)
    extrude(amount=CUT_EXTRUDE8_DEPTH, mode=Mode.SUBTRACT)

    # Sketch11 → Cut-Extrude9 (cut)
    with BuildSketch(Plane.XY):
        with Locations((80.497725907, 195.306669266)):
            Rectangle(SKETCH11_W, SKETCH11_H)
    extrude(amount=CUT_EXTRUDE9_DEPTH, mode=Mode.SUBTRACT)

    # Sketch12 → Boss-Extrude6 (add)
    with BuildSketch(Plane.XY):
        with Locations((24.932297307, 195.306669266)):
            Rectangle(SKETCH12_W, SKETCH12_H)
        with Locations((80.497725907, 195.306669266)):
            Rectangle(SKETCH12_W_2, SKETCH12_H)
    extrude(amount=BOSS_EXTRUDE6_DEPTH)

    # Sketch13 → Cut-Extrude10 (cut)
    with BuildSketch(Plane.XY):
        with BuildLine():
            Line((-25.152274089, 109.943002837), (-25.152274089, 38.227274077))
            ThreePointArc((-25.152274089, 38.227274077), (-21.010138466, 28.22727408), (-11.010138469, 24.085138457))
            Line((-11.010138469, 24.085138457), (22.705590287, 24.085138457))
            ThreePointArc((22.705590287, 24.085138457), (32.705590285, 28.22727408), (36.847725907, 38.227274077))
            Line((36.847725907, 38.227274077), (36.847725907, 109.943002837))
            ThreePointArc((36.847725907, 109.943002837), (32.705590285, 119.943002835), (22.705590287, 124.085138457))
            Line((22.705590287, 124.085138457), (-11.010138469, 124.085138457))
            ThreePointArc((-11.010138469, 124.085138457), (-21.010138466, 119.943002835), (-25.152274089, 109.943002837))
        make_face()
        with BuildLine():
            Line((120.705590284, 24.085138457), (86.989861527, 24.085138457))
            ThreePointArc((86.989861527, 24.085138457), (76.98986153, 28.22727408), (72.847725907, 38.227274077))
            Line((72.847725907, 38.227274077), (72.847725907, 109.943002837))
            ThreePointArc((72.847725907, 109.943002837), (76.98986153, 119.943002835), (86.989861527, 124.085138457))
            Line((86.989861527, 124.085138457), (120.705590284, 124.085138457))
            ThreePointArc((120.705590284, 124.085138457), (130.705590281, 119.943002835), (134.847725904, 109.943002837))
            Line((134.847725904, 109.943002837), (134.847725904, 38.227274077))
            ThreePointArc((134.847725904, 38.227274077), (130.705590281, 28.22727408), (120.705590284, 24.085138457))
        make_face()
    extrude(amount=CUT_EXTRUDE10_DEPTH, mode=Mode.SUBTRACT)

    # Sketch14 → Cut-Extrude11 (cut)
    with BuildSketch(Plane.XY):
        with Locations((47.261123367, 151.785138461)):
            Circle(SKETCH14_R)
        with Locations((62.347725907, 151.785138461)):
            Circle(SKETCH14_R)
    extrude(amount=CUT_EXTRUDE11_DEPTH, mode=Mode.SUBTRACT)


solid = part_1.part
